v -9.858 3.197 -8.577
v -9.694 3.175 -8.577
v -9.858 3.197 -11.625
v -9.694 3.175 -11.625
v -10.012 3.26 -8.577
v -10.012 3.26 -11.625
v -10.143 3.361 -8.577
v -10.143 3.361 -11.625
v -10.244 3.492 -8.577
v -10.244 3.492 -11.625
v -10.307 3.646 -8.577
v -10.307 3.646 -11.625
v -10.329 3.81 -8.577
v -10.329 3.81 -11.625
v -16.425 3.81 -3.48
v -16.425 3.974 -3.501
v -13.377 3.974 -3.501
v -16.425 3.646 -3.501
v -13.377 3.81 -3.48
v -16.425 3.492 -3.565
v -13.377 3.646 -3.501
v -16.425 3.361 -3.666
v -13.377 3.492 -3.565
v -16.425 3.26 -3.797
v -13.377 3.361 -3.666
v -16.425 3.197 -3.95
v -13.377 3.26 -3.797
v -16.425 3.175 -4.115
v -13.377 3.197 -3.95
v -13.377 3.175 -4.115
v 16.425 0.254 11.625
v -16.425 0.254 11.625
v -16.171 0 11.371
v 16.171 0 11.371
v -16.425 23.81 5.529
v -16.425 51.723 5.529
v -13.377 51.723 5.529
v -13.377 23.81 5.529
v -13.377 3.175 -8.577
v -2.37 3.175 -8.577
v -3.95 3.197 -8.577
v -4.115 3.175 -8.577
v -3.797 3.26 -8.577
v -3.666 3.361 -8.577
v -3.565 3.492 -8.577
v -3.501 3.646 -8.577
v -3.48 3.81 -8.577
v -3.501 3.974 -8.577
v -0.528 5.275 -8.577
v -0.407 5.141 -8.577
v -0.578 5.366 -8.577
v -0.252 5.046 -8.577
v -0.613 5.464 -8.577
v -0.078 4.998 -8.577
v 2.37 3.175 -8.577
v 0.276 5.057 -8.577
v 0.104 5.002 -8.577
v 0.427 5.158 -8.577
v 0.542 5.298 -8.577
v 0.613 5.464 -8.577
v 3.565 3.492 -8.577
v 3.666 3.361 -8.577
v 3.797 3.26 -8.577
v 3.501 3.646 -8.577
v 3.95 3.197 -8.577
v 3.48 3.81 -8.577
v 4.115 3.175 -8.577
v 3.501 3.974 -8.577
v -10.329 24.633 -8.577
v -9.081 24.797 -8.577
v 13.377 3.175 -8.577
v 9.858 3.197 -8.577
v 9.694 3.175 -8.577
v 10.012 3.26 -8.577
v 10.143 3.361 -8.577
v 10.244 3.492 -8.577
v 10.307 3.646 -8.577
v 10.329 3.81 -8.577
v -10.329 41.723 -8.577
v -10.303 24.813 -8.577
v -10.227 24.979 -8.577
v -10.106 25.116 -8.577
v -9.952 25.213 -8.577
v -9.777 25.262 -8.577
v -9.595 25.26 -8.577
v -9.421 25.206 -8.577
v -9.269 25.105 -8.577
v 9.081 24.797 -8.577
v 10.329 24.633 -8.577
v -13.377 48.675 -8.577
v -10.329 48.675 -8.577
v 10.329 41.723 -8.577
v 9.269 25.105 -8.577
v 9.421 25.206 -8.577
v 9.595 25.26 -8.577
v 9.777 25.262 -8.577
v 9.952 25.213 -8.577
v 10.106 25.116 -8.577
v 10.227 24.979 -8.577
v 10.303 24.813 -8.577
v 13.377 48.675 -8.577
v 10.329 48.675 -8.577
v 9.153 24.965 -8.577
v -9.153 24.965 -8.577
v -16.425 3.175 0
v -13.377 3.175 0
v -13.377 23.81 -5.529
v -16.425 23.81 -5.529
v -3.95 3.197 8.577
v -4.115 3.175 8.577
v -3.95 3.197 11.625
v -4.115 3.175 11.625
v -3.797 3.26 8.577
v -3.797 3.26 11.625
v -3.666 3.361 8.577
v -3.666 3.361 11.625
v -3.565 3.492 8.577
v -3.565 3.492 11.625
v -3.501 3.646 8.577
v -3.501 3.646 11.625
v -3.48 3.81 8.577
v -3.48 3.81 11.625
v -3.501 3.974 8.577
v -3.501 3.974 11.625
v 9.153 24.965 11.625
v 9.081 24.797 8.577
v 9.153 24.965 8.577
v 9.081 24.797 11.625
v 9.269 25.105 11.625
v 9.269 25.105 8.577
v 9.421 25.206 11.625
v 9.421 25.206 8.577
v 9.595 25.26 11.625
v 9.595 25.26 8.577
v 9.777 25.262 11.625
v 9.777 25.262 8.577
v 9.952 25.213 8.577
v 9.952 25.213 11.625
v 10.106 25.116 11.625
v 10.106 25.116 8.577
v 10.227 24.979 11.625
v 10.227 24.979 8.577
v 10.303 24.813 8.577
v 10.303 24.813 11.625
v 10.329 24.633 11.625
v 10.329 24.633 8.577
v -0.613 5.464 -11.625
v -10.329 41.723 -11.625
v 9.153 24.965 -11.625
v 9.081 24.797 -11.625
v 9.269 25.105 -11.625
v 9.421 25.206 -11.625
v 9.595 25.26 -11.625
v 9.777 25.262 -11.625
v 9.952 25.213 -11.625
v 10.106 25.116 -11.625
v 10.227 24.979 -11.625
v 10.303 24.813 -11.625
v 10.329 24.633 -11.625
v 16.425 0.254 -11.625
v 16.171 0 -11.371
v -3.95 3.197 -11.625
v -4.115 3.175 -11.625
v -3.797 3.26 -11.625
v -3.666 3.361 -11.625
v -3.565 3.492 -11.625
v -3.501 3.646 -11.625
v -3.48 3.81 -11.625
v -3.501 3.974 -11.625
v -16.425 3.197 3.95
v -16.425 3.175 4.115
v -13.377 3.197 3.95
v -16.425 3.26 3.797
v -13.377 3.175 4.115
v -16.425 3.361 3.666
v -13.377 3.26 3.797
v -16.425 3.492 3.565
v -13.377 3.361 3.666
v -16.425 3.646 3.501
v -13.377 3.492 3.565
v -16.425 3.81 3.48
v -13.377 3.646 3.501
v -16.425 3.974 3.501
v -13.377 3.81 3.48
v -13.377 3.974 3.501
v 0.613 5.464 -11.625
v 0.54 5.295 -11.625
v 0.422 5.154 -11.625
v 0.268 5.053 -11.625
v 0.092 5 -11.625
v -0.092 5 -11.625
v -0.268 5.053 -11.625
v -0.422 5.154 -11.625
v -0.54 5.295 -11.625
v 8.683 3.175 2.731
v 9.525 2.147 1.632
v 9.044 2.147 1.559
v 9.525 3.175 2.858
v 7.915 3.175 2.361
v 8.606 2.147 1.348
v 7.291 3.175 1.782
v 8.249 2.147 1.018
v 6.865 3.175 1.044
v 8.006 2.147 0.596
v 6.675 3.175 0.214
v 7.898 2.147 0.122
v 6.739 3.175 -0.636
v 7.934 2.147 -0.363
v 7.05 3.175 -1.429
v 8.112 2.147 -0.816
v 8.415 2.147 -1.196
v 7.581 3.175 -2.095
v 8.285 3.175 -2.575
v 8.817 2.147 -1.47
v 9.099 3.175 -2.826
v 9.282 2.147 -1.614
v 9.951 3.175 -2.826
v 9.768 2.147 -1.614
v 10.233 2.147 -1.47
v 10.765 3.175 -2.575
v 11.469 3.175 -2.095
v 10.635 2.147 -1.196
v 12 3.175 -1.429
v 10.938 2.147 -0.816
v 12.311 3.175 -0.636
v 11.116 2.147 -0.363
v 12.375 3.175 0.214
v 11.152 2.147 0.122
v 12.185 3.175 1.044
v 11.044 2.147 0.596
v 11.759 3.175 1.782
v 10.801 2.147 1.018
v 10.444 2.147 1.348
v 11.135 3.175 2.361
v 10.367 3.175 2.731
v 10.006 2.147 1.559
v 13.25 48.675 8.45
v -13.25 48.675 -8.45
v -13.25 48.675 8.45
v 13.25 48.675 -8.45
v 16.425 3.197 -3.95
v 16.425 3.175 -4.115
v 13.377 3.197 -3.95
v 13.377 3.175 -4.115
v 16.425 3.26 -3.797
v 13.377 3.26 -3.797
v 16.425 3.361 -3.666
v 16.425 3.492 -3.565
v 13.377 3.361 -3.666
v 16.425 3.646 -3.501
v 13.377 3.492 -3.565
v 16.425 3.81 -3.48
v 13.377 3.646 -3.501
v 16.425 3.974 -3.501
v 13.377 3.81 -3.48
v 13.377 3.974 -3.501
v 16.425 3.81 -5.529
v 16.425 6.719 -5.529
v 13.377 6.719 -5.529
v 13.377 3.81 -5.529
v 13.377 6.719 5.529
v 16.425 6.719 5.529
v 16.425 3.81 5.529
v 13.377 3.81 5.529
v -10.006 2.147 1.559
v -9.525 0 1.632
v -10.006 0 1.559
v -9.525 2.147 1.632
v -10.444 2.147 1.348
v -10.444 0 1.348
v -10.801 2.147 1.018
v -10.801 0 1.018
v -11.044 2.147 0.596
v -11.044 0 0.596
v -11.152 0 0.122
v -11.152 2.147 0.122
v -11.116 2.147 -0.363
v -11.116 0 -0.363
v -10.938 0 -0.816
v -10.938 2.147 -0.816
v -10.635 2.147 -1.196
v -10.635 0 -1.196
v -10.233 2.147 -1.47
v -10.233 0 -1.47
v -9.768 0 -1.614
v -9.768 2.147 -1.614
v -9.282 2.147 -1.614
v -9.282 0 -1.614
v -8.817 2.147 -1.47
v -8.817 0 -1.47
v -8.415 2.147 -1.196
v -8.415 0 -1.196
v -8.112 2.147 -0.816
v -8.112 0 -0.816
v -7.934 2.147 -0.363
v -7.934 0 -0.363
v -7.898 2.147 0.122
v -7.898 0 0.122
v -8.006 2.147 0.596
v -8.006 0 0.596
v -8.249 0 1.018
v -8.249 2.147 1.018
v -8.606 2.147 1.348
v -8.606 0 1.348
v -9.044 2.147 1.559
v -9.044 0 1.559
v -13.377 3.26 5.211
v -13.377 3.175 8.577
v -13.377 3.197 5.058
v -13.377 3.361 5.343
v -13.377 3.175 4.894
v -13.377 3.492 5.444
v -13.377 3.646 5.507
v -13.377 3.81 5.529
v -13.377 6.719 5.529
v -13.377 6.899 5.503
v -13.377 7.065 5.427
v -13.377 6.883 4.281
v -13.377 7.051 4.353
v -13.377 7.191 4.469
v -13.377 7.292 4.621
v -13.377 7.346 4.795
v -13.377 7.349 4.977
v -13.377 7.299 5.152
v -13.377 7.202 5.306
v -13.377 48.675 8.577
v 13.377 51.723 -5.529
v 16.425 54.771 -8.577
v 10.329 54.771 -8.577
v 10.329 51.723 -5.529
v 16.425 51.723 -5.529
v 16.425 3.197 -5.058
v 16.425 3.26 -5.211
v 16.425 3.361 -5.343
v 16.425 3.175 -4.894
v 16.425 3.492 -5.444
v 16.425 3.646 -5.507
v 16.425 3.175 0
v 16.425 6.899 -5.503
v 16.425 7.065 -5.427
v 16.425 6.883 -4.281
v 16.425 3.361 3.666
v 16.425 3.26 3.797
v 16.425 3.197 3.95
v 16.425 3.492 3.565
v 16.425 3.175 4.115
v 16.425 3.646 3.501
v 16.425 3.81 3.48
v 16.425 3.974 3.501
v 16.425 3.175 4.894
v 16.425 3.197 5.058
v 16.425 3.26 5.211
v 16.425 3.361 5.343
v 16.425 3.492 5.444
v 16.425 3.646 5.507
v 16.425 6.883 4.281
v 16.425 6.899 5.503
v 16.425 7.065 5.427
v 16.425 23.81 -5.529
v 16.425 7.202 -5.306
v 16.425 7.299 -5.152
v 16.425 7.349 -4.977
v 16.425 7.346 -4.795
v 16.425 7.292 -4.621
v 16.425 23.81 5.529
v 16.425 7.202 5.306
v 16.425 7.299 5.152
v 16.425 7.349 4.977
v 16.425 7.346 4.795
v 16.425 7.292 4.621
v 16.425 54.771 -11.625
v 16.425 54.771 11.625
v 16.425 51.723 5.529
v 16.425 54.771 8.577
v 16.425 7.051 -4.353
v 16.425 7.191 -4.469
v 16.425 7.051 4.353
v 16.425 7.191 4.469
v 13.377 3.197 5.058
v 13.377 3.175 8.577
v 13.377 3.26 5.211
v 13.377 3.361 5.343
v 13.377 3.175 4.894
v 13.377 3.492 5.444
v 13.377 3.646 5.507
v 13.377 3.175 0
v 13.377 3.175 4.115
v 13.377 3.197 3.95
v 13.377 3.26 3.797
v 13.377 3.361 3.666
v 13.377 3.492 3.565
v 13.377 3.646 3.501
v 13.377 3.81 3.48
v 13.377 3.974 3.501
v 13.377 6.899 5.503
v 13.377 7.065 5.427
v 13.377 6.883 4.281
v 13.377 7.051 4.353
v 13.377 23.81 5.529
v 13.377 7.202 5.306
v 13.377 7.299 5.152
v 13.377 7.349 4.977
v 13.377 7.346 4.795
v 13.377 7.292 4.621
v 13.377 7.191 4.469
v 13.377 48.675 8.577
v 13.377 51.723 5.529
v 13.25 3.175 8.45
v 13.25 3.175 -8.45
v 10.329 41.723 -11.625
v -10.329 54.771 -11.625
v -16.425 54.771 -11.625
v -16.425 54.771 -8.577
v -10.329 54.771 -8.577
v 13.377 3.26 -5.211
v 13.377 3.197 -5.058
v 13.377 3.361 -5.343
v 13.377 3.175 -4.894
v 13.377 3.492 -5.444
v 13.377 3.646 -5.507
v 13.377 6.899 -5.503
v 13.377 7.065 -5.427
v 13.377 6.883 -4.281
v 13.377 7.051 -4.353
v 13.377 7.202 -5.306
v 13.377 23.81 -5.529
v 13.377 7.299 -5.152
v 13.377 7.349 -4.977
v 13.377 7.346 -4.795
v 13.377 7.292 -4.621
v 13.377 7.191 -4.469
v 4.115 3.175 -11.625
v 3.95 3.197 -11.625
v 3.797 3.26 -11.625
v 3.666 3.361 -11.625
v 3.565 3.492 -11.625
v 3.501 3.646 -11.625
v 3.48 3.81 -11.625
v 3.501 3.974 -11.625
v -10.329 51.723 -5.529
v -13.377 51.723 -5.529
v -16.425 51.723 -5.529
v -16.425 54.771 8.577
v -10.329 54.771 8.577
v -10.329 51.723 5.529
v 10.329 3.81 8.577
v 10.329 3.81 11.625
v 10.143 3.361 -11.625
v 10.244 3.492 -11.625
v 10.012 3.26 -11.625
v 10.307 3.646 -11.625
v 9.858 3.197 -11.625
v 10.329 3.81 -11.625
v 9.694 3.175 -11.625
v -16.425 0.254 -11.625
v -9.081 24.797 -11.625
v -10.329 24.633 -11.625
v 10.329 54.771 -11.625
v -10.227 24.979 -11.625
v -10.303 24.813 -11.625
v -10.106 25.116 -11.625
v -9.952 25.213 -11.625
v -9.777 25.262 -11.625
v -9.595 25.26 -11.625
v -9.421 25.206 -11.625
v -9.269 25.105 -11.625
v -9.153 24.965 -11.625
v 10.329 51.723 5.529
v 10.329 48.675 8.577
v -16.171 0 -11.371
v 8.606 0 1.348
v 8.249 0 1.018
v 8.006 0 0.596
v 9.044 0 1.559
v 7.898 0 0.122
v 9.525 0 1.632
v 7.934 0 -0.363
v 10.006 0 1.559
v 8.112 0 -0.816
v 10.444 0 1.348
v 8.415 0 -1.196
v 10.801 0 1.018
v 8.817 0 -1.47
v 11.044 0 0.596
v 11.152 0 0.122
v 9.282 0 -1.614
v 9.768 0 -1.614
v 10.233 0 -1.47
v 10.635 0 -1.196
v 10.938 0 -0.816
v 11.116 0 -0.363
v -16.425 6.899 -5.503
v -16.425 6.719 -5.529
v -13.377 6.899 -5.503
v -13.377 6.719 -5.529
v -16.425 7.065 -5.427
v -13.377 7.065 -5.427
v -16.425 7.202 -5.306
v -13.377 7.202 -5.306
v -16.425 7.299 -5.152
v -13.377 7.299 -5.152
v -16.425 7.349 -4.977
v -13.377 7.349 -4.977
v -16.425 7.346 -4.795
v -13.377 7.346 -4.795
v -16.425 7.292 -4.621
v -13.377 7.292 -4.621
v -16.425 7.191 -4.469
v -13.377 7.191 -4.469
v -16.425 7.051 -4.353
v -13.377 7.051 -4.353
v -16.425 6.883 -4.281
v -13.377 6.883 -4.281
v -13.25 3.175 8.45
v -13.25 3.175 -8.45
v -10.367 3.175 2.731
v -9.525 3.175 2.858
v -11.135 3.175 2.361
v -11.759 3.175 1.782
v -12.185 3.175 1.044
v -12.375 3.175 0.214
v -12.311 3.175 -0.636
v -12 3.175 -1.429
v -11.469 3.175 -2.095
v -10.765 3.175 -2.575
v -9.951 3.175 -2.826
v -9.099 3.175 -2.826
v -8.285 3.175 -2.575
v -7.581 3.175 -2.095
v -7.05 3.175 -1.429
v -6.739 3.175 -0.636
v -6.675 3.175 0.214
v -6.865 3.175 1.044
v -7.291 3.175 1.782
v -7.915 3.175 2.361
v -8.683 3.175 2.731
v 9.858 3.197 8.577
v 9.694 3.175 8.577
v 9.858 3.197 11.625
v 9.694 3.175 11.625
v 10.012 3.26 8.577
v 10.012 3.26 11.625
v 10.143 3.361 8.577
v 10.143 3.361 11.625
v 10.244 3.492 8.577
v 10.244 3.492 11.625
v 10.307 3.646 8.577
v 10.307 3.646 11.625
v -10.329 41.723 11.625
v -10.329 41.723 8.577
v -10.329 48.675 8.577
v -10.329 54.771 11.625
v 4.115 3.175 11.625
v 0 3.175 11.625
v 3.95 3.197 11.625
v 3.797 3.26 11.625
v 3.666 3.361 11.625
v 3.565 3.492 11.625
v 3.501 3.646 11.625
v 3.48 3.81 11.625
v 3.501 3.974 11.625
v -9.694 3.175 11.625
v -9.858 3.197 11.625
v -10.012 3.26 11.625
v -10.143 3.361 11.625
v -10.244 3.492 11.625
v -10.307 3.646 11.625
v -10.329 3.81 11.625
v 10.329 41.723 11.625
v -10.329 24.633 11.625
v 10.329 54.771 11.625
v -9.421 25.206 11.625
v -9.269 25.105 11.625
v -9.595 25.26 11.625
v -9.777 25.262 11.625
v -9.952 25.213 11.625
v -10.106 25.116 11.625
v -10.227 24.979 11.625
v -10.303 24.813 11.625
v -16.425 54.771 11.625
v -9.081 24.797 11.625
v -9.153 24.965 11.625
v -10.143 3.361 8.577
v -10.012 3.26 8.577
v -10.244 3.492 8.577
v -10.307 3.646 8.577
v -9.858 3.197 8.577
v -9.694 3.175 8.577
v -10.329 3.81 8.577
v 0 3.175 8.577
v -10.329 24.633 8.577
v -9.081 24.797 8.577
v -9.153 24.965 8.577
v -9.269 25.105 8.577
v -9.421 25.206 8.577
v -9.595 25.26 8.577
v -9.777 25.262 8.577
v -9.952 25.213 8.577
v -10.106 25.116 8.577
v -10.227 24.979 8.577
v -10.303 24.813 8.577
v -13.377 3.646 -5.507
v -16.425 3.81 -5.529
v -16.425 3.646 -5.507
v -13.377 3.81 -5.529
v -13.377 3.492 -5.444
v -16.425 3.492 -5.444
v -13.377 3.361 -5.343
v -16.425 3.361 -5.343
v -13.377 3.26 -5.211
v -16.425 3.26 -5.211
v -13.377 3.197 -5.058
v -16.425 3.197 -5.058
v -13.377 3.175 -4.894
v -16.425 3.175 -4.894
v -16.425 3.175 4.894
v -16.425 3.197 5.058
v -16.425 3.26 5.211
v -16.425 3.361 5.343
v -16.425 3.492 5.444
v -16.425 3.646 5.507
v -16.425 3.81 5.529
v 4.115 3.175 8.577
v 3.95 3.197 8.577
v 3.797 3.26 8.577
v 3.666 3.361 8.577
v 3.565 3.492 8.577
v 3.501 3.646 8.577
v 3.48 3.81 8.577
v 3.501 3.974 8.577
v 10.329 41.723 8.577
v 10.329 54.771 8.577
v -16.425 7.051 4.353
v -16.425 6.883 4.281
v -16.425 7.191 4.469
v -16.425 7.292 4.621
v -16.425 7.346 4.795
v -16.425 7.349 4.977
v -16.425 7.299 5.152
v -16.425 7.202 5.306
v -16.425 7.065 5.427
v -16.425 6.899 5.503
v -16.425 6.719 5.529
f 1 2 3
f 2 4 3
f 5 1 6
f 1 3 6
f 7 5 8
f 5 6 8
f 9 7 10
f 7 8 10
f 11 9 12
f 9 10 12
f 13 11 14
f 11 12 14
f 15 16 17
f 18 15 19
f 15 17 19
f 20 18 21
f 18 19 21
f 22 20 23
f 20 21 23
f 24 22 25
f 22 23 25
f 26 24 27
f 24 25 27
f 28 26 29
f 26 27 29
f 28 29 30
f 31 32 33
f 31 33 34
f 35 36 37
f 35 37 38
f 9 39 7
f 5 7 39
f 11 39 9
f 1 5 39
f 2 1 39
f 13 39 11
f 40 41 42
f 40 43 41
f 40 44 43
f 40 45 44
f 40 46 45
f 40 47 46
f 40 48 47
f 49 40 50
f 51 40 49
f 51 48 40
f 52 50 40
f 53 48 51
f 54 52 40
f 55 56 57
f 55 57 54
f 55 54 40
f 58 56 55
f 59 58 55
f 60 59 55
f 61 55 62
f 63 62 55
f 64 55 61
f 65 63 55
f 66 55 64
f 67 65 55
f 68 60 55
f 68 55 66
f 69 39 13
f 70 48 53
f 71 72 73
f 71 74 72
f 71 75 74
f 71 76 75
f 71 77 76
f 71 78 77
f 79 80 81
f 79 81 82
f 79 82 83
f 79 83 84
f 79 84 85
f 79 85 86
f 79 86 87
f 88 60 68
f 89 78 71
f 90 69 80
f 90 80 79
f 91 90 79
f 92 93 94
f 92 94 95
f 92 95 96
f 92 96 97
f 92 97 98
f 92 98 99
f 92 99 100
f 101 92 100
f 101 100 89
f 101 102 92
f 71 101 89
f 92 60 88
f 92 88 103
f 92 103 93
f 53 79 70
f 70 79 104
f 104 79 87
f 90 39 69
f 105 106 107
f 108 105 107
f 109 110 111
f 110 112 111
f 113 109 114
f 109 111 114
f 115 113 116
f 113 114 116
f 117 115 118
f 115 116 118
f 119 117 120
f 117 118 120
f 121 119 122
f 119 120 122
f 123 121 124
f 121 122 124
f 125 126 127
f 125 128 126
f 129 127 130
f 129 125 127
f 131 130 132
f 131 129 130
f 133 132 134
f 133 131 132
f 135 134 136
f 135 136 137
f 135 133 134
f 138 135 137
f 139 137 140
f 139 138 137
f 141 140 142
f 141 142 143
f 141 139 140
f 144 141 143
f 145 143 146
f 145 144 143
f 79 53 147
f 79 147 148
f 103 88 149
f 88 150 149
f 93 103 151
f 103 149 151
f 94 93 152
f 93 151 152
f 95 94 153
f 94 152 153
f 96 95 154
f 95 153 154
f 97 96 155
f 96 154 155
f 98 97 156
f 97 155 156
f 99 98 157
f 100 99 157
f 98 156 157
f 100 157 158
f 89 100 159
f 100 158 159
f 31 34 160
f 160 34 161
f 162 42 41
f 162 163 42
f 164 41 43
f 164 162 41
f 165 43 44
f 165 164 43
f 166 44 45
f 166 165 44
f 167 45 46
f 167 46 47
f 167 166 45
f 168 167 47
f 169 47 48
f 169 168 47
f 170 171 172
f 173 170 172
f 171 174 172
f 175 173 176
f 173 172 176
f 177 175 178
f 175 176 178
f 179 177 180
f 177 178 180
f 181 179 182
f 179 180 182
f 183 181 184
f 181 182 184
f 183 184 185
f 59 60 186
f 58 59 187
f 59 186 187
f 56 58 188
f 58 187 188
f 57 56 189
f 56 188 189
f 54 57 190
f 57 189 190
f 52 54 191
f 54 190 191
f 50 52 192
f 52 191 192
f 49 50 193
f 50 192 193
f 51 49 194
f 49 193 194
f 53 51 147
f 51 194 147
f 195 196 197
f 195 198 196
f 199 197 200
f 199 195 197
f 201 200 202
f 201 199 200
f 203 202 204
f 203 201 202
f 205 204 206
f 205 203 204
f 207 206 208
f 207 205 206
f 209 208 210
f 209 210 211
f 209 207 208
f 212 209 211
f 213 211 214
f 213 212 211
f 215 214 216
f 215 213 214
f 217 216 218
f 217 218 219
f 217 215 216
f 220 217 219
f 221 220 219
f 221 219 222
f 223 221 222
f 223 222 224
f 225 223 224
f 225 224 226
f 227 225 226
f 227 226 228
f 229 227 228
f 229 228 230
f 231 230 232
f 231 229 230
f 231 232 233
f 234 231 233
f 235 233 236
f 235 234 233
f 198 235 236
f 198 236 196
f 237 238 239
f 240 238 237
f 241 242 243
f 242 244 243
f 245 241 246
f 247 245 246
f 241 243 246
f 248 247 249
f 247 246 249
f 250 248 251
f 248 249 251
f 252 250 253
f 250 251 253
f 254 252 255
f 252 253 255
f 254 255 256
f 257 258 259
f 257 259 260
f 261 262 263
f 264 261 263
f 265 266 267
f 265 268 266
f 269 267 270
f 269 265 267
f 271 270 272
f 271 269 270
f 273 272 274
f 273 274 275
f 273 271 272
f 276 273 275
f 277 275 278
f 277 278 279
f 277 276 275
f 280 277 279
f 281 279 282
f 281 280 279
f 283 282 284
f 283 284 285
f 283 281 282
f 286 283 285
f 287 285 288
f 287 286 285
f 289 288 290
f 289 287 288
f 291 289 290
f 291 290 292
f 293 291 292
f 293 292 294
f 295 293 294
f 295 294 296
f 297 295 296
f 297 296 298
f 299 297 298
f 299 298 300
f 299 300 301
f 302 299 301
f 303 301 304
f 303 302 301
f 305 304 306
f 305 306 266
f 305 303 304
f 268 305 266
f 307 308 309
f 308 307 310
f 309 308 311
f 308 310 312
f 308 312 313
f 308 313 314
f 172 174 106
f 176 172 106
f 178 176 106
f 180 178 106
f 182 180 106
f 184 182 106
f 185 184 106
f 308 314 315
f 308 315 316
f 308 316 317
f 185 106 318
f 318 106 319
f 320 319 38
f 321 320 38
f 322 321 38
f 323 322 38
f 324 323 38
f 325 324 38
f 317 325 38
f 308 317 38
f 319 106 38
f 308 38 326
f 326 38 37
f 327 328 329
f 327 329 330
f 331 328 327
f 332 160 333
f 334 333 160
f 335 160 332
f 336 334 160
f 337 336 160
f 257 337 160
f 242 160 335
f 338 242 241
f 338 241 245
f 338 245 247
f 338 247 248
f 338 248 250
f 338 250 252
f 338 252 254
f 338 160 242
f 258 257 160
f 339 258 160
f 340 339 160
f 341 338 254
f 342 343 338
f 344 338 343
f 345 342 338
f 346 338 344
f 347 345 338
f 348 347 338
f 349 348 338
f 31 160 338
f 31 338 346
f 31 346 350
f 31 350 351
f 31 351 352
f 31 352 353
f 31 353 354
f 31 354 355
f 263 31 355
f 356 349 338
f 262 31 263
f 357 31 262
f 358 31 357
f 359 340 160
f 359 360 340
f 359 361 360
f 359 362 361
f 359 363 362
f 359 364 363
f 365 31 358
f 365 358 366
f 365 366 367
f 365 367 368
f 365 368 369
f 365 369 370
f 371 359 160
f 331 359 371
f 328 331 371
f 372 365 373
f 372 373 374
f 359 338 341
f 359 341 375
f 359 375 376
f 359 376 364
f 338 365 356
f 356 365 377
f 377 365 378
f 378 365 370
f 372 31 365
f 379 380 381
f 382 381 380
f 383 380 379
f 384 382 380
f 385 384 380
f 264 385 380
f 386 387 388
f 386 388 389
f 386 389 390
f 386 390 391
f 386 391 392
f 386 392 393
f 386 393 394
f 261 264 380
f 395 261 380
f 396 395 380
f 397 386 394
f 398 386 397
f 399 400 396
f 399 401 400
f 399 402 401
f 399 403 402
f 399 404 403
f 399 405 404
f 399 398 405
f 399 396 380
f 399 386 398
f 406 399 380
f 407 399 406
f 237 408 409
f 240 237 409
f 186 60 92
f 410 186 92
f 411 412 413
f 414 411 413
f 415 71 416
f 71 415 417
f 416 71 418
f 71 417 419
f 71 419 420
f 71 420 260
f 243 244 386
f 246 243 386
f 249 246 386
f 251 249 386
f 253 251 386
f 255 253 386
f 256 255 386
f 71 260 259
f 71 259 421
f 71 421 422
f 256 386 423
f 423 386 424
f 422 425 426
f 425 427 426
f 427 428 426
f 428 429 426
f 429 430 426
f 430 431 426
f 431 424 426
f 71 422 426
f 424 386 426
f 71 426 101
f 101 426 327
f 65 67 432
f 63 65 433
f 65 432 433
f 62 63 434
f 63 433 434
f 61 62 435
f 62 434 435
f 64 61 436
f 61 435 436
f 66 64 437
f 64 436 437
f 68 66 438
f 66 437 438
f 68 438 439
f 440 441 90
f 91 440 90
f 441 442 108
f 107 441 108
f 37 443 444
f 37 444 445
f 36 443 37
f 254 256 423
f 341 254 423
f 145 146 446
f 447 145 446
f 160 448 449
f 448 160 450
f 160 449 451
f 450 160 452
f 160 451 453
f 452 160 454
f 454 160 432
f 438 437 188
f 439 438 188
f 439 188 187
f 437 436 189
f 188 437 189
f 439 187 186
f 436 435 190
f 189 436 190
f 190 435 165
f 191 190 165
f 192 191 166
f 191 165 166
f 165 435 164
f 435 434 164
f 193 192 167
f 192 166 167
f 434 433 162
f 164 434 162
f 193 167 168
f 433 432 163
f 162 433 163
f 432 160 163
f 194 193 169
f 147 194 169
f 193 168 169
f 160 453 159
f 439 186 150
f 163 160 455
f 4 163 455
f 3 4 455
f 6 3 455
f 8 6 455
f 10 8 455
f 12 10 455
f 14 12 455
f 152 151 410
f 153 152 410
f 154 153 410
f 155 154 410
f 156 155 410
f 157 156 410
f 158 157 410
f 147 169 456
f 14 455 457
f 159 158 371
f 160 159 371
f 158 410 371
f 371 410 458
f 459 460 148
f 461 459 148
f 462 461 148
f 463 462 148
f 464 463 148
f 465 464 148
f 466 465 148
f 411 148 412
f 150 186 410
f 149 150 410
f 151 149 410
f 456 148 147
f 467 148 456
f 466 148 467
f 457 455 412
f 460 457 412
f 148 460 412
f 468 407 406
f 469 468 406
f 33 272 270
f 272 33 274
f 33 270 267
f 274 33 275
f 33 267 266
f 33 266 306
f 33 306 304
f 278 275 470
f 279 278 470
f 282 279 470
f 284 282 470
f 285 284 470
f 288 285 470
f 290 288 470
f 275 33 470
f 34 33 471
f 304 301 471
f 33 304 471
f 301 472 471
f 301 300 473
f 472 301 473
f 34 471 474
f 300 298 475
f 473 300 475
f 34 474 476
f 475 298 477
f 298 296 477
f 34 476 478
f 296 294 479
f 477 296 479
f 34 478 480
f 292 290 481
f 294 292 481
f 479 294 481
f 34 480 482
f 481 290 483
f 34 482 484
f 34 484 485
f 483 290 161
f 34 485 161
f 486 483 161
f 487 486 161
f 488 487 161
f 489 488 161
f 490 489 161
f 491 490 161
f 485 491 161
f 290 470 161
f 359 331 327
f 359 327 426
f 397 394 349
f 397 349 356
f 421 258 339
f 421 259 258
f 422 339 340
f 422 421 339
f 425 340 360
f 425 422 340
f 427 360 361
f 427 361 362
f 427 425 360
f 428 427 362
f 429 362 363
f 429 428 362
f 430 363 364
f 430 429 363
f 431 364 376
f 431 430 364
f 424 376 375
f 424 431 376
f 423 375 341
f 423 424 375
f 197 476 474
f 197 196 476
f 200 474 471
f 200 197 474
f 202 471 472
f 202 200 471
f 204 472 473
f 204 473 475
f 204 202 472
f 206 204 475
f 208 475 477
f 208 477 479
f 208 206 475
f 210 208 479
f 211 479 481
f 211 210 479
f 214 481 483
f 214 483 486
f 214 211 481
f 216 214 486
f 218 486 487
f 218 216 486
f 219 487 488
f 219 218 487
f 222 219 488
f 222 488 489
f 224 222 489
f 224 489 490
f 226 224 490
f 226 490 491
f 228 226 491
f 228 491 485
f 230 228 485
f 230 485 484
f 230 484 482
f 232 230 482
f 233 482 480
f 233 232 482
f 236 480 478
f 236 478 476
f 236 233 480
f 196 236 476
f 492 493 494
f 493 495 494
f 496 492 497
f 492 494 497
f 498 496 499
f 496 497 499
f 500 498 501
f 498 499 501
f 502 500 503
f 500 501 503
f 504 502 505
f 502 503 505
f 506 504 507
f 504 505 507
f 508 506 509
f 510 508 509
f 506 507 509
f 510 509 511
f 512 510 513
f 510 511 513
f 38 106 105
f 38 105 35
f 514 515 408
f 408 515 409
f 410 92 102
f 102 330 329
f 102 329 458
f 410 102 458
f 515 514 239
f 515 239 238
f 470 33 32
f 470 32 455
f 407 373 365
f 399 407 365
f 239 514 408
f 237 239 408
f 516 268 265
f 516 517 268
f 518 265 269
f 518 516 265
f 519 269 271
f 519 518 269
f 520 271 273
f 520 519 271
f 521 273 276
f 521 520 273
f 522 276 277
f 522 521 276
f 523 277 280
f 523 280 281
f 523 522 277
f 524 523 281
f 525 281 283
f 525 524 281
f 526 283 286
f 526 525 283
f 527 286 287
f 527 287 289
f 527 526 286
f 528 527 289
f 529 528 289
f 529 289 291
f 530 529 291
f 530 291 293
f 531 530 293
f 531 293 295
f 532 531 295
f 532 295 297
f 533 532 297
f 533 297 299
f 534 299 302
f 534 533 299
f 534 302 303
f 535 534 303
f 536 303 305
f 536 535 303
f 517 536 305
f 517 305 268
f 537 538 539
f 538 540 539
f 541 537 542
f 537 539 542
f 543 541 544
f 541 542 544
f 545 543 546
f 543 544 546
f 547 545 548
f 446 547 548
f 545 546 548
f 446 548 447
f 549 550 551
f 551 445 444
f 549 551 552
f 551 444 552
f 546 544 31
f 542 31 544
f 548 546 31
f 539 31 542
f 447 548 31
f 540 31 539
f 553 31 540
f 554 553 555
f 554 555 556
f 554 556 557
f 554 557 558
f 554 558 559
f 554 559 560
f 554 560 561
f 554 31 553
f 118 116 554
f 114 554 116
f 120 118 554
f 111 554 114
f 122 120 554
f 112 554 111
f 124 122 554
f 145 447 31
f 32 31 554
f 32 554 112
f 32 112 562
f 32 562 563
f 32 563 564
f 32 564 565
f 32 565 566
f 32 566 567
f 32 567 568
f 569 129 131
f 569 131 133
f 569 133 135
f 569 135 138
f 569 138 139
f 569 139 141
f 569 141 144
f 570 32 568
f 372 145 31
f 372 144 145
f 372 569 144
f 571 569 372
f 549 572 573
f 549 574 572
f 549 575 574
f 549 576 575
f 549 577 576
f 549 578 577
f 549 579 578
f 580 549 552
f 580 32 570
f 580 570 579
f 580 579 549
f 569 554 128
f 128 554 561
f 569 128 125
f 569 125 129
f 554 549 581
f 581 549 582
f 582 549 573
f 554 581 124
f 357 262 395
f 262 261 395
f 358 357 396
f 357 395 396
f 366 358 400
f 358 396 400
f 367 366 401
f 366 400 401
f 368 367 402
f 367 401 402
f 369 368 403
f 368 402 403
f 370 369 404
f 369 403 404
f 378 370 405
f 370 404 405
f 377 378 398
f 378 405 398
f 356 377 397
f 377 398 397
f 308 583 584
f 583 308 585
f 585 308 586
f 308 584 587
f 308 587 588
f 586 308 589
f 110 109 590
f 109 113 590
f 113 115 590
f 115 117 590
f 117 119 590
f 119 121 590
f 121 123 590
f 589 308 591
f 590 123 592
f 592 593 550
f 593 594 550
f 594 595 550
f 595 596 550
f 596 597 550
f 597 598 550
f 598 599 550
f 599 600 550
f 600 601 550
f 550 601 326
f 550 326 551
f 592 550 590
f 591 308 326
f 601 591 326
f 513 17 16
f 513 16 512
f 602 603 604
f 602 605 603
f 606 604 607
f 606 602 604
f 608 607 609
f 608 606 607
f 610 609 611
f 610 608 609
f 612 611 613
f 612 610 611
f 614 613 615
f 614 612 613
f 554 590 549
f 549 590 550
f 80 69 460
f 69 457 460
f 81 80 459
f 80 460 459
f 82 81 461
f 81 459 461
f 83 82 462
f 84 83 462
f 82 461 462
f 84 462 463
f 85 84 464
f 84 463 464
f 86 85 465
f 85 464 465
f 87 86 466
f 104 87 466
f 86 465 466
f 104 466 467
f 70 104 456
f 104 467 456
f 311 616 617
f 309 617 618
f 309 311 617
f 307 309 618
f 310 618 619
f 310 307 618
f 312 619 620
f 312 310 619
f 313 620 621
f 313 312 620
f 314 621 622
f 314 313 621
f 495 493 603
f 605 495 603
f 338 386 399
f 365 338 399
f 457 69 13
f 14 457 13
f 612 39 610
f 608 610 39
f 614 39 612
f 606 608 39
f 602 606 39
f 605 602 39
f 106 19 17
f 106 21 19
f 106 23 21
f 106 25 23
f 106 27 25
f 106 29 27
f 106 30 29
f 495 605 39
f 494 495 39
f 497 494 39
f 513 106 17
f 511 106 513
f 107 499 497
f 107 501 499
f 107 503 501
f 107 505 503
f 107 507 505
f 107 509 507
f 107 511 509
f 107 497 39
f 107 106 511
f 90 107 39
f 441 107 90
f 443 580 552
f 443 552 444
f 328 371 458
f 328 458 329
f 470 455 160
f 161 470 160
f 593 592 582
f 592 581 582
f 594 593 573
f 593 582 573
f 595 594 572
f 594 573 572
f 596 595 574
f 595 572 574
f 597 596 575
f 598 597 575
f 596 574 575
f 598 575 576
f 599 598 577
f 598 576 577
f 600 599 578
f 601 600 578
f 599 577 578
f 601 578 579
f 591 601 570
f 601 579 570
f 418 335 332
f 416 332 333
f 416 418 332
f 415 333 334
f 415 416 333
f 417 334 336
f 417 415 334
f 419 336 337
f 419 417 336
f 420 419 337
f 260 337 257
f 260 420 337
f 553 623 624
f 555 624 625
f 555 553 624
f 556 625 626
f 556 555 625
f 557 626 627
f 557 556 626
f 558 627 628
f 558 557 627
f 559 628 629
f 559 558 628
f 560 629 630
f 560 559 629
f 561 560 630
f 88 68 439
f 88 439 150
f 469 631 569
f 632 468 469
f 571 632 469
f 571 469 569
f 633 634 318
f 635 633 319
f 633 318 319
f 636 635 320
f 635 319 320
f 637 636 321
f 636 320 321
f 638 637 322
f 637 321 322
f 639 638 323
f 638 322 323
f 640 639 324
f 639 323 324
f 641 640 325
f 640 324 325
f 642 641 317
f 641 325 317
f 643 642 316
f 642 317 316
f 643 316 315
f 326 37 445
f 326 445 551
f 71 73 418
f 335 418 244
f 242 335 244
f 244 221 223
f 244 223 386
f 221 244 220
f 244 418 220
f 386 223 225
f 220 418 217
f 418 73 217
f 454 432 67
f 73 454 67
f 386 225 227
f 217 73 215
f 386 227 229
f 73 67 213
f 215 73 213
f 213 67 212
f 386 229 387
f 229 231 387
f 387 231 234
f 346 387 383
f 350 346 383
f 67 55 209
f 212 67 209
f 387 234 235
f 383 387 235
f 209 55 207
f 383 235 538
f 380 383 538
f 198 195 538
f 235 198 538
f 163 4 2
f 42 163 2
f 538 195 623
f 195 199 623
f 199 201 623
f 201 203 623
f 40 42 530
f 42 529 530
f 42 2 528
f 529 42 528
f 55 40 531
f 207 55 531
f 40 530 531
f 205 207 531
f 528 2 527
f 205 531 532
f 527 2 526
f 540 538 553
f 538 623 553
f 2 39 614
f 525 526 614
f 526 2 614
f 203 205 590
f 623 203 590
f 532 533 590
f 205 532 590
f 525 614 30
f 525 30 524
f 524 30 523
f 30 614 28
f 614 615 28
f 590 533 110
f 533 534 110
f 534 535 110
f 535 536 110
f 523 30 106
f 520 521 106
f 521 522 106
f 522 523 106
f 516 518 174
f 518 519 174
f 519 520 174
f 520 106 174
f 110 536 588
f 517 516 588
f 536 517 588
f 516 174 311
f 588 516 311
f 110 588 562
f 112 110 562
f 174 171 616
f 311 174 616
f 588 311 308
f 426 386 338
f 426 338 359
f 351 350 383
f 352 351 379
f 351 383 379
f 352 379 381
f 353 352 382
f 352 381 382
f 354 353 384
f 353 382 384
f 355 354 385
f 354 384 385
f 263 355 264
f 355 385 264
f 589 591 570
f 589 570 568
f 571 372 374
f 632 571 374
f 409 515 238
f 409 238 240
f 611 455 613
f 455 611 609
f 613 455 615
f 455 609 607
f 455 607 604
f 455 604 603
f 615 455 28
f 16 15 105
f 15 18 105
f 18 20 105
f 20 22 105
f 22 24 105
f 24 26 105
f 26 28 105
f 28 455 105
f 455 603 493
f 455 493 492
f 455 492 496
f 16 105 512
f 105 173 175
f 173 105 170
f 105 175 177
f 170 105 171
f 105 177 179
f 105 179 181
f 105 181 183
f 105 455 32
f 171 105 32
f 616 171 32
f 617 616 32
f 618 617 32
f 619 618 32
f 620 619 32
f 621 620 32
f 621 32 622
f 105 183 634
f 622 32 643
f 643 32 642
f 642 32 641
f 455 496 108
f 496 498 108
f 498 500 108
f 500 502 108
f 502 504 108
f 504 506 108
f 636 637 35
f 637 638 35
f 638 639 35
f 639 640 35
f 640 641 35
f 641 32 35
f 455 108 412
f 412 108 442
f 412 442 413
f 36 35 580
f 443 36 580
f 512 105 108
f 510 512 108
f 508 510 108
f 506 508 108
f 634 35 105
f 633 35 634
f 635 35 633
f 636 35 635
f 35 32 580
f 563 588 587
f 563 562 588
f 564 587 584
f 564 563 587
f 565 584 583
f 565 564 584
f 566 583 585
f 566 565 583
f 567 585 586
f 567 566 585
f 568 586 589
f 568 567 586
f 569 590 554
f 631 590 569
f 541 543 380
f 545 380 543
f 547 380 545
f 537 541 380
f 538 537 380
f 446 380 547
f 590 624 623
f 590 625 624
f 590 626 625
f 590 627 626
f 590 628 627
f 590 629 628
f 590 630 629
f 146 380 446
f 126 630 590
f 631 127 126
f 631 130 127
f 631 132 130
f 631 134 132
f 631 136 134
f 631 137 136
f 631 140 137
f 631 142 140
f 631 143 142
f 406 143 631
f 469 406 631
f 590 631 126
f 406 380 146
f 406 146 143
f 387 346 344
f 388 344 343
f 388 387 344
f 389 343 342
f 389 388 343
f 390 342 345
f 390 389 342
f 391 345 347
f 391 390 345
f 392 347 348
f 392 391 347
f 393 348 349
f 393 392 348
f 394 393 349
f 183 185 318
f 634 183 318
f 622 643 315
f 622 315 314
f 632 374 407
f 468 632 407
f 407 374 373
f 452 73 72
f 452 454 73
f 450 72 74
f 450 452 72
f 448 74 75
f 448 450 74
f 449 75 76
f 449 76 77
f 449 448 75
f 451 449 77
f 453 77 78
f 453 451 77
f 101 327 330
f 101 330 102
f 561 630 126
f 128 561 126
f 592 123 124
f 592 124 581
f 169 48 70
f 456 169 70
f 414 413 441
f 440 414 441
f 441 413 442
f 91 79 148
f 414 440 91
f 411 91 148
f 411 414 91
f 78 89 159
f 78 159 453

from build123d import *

# Parameters (mm, degrees)
SKETCH1_W                                 = 32.850000086
SKETCH1_H                                 = 23.249999982
BOSS_EXTRUDE1_DEPTH                       = 3.175
SKETCH2_W                                 = 26.500000086
SKETCH2_H                                 = 16.899999982
BATTERY_DEPTH                             = 45.499999932
CSK_FOR_4_FLAT_HEAD_MACHINE_SCREW_2_COUNT = 2
CSK_FOR_4_FLAT_HEAD_MACHINE_SCREW_2_PITCH = 19.05
BOSS_EXTRUDE4_DEPTH                       = 45.499999932
RIB1_START                                = -3.048
RIB1_DEPTH                                = 3.048
CUT_EXTRUDE1_DEPTH                        = 3.048
MIRROR2_START                             = -3.048
MIRROR2_COPY_1_DEPTH                      = 3.048
MIRROR2_COPY_2_DEPTH                      = 3.048
BOSS_EXTRUDE5_REACH                       = 61.862
BOSS_EXTRUDE6_DEPTH                       = 3.048
BOSS_EXTRUDE7_DEPTH                       = 6.096
BOSS_EXTRUDE8_DEPTH                       = 3.048
RIB4_REACH                                = 66.916
SKETCH22_WALL_W                           = 153.195008736
SKETCH22_WALL_H                           = 3.048
CUT_EXTRUDE2_DEPTH                        = 3.048
MIRROR7_COPY_1_REACH                      = 66.916
MIRROR7_COPY_1_SKETCH_W                   = 153.195008736
MIRROR7_COPY_1_SKETCH_H                   = 3.048
MIRROR7_COPY_2_DEPTH                      = 3.048
FILLET2_R                                 = 0.635
CHAMFER_FOR_ELEPHANT_S_FOOT_SIZE          = 0.254


# Read off the part's stored shape, not the designer's step: Rib1
with BuildPart() as part:
    # Sketch1 → Boss-Extrude1 (new body)
    with BuildSketch(Plane(origin=(0, 0, 0), x_dir=(1, 0, 0), z_dir=(0, 1, 0))):
        Rectangle(SKETCH1_W, SKETCH1_H)
    extrude(amount=BOSS_EXTRUDE1_DEPTH)

    # Sketch13 → CSK for _4 Flat Head Machine Screw _100 (revolve, cut)
    with BuildSketch(Plane(origin=(-9.525, 3.175, 0), x_dir=(0, 0, 1), z_dir=(1, 0, 0))):
        Polygon((0, 0), (0, 3.175), (1.63195, 3.175), (1.63195, 1.028358553), (2.8575, 0), align=None)
    csk_for_4_flat_head_machine_screw_100 = revolve(axis=Axis((-9.525, 9.525, 0), (0, -1, 0)), mode=Mode.SUBTRACT)

    # CSK for _4 Flat Head Machine Screw _ 2: CSK for _4 Flat Head Machine Screw _100 ×2
    with Locations(*[(i * CSK_FOR_4_FLAT_HEAD_MACHINE_SCREW_2_PITCH, 0, 0) for i in range(1, CSK_FOR_4_FLAT_HEAD_MACHINE_SCREW_2_COUNT)]):
        add(csk_for_4_flat_head_machine_screw_100, mode=Mode.SUBTRACT)

    # Sketch14 → Boss-Extrude4 (add)
    with BuildSketch(Plane(origin=(0, 3.175, 0), x_dir=(1, 0, 0), z_dir=(0, 1, 0))):
        Polygon((16.425000043, -11.624999991), (16.425000043, -5.528999991), (13.377000043, -5.528999991), (13.377000043, -8.576999991), (10.329000043, -8.576999991), (10.329000043, -11.624999991), align=None)
        Polygon((13.377000043, 8.576999991), (13.377000043, 5.528999991), (16.425000043, 5.528999991), (16.425000043, 11.624999991), (10.329000043, 11.624999991), (10.329000043, 8.576999991), align=None)
        Polygon((-10.329000043, 8.576999991), (-10.329000043, 11.624999991), (-16.425000043, 11.624999991), (-16.425000043, 5.528999991), (-13.377000043, 5.528999991), (-13.377000043, 8.576999991), align=None)
        Polygon((-16.425000043, -11.624999991), (-10.329000043, -11.624999991), (-10.329000043, -8.576999991), (-13.377000043, -8.576999991), (-13.377000043, -5.528999991), (-16.425000043, -5.528999991), align=None)
    extrude(amount=BOSS_EXTRUDE4_DEPTH)

    # Rib1 outline → Rib1 (add)
    with BuildSketch(Plane.XY.offset(11.624999991).offset(RIB1_START)):
        Polygon((-10.329000043, 3.175), (0, 3.175), (-10.329000043, 41.723352952), align=None)
    rib1 = extrude(amount=RIB1_DEPTH)

    # Sketch18 → Cut-Extrude1 (cut)
    with BuildSketch(Plane(origin=(0, 0, 8.576999991), x_dir=(-1, 0, 0), z_dir=(0, 0, -1))):
        Polygon((10.329000043, 29.456094958), (10.329000043, 3.175), (3.287001873, 3.175), align=None)
    cut_extrude1 = extrude(amount=-CUT_EXTRUDE1_DEPTH, mode=Mode.SUBTRACT)

    # Mirror1: Rib1, Cut-Extrude1 across plane
    add(rib1.mirror(Plane.XY))
    add(cut_extrude1.mirror(Plane.XY), mode=Mode.SUBTRACT)

    # Mirror2: Rib1, Cut-Extrude1 across plane
    add(rib1.mirror(Plane(origin=(0, 0, 0), x_dir=(0, 0, 1), z_dir=(1, 0, 0))))
    add(cut_extrude1.mirror(Plane(origin=(0, 0, 0), x_dir=(0, 0, 1), z_dir=(1, 0, 0))), mode=Mode.SUBTRACT)

    # Mirror2 copy 1 sketch → Mirror2 copy 1 (add)
    with BuildSketch(Plane(origin=(0, 0, -11.624999991), x_dir=(-1, 0, 0), z_dir=(0, 0, -1)).offset(MIRROR2_START)):
        Polygon((-10.329000043, 3.175), (0, 3.175), (-10.329000043, 41.723352952), align=None)
    extrude(amount=MIRROR2_COPY_1_DEPTH)

    # Mirror2 copy 2 sketch → Mirror2 copy 2 (cut)
    with BuildSketch(Plane.XY.offset(-8.576999991)):
        Polygon((10.329000043, 29.456094958), (10.329000043, 3.175), (3.287001873, 3.175), align=None)
    extrude(amount=-MIRROR2_COPY_2_DEPTH, mode=Mode.SUBTRACT)

    # Boss-Extrude5: up to this face of the body (flat: up to its plane)
    boss_extrude5_end = Plane(part.part.faces().sort_by_distance((10.329000043, 45.199176442, 10.100999991))[0])
    # Sketch19 → Boss-Extrude5 (add, up to the picked face)
    with BuildSketch(Plane.ZY.offset(-16.425000043), mode=Mode.PRIVATE) as boss_extrude5_sk1:
        Polygon((5.528999991, 51.722999932), (8.576999991, 48.674999932), (11.624999991, 48.674999932), (11.624999991, 51.722999932), align=None)
    boss_extrude5_tool1 = split(extrude(boss_extrude5_sk1.sketch, amount=BOSS_EXTRUDE5_REACH, mode=Mode.PRIVATE), bisect_by=boss_extrude5_end, keep=Keep.BOTH, mode=Mode.PRIVATE)
    # Sketch19 → Boss-Extrude5 (add, up to the picked face)
    with BuildSketch(Plane.ZY.offset(-16.425000043), mode=Mode.PRIVATE) as boss_extrude5_sk2:
        Polygon((8.576999991, 54.770999932), (5.528999991, 51.722999932), (11.624999991, 51.722999932), (11.624999991, 54.770999932), align=None)
    boss_extrude5_tool2 = split(extrude(boss_extrude5_sk2.sketch, amount=BOSS_EXTRUDE5_REACH, mode=Mode.PRIVATE), bisect_by=boss_extrude5_end, keep=Keep.BOTH, mode=Mode.PRIVATE)
    boss_extrude5_1 = boss_extrude5_tool1.solids().sort_by(Axis((16.425, 50.368333, 9.254333), (-1, 0, 0)))[0]
    add(boss_extrude5_1)
    boss_extrude5_2 = boss_extrude5_tool2.solids().sort_by(Axis((16.425, 53.077667, 9.254333), (-1, 0, 0)))[0]
    add(boss_extrude5_2)
    boss_extrude5 = boss_extrude5_1 + boss_extrude5_2  # Boss-Extrude5 as one shape, for the pattern or mirror that repeats it

    # Sketch19<3> → Boss-Extrude6 (add)
    with BuildSketch(Plane.ZY.offset(-16.425000043)):
        Polygon((5.528999991, 48.674999932), (8.576999991, 48.674999932), (5.528999991, 51.722999932), align=None)
    boss_extrude6 = extrude(amount=BOSS_EXTRUDE6_DEPTH)

    # Sketch20 → Boss-Extrude7 (add)
    with BuildSketch(Plane.ZY.offset(16.425000043)):
        Polygon((8.576999991, 54.770999932), (5.528999991, 51.722999932), (8.576999991, 48.674999932), (11.624999991, 48.674999932), (11.624999991, 54.770999932), align=None)
    boss_extrude7 = extrude(amount=-BOSS_EXTRUDE7_DEPTH)

    # Sketch20<3> → Boss-Extrude8 (add)
    with BuildSketch(Plane.ZY.offset(16.425000043)):
        Polygon((5.528999991, 51.722999932), (5.528999991, 48.674999932), (8.576999991, 48.674999932), align=None)
    boss_extrude8 = extrude(amount=-BOSS_EXTRUDE8_DEPTH)

    # Mirror3: Boss-Extrude5, Boss-Extrude6, Boss-Extrude7, Boss-Extrude8 across plane
    add(boss_extrude5.mirror(Plane.XY))
    add(boss_extrude6.mirror(Plane.XY))
    add(boss_extrude7.mirror(Plane.XY))
    add(boss_extrude8.mirror(Plane.XY))

    # Sketch22 wall → Rib4 (add, up to next)
    with BuildSketch(Plane(origin=(16.425000043, 13.492254441, 2.764499996), x_dir=(0, 0.965925826288, 0.258819045108), z_dir=(0, -0.258819045108, 0.965925826288)), mode=Mode.PRIVATE) as rib4_sk1:
        with Locations((0, 1.524)):
            Rectangle(SKETCH22_WALL_W, SKETCH22_WALL_H)
    rib4_tool1 = extrude(rib4_sk1.sketch, amount=RIB4_REACH, mode=Mode.PRIVATE) - part.part
    rib4 = rib4_tool1.solids().sort_by_distance((16.425000043, 13.492254441, 2.764499996))[0]
    add(rib4)

    # Sketch23 → Cut-Extrude2 (cut)
    with BuildSketch(Plane(origin=(16.425000043, 0, 0), x_dir=(0, 0, -1), z_dir=(1, 0, 0))):
        Polygon((-5.528999991, 3.175), (-3.287001873, 3.175), (-5.528999991, 11.542250888), align=None)
    cut_extrude2 = extrude(amount=-CUT_EXTRUDE2_DEPTH, mode=Mode.SUBTRACT)

    # Mirror6: Rib4, Cut-Extrude2 across plane
    add(rib4.mirror(Plane(origin=(0, 0, 0), x_dir=(0, 0, 1), z_dir=(1, 0, 0))))
    add(cut_extrude2.mirror(Plane(origin=(0, 0, 0), x_dir=(0, 0, 1), z_dir=(1, 0, 0))), mode=Mode.SUBTRACT)

    # Mirror7: Rib4, Cut-Extrude2 across plane
    add(rib4.mirror(Plane.XY))
    add(cut_extrude2.mirror(Plane.XY), mode=Mode.SUBTRACT)

    # Mirror7 copy 1 sketch → Mirror7 copy 1 (add, up to next)
    with BuildSketch(Plane(origin=(-16.425000043, 13.492254441, -2.764499996), x_dir=(0, 0.965925826288, -0.258819045108), z_dir=(0, -0.258819045108, -0.965925826288)), mode=Mode.PRIVATE) as mirror7_copy_1_sk1:
        with Locations((0, 1.524)):
            Rectangle(MIRROR7_COPY_1_SKETCH_W, MIRROR7_COPY_1_SKETCH_H)
    mirror7_copy_1_tool1 = extrude(mirror7_copy_1_sk1.sketch, amount=MIRROR7_COPY_1_REACH, mode=Mode.PRIVATE) - part.part
    add(mirror7_copy_1_tool1.solids().sort_by_distance((-16.425000043, 13.492254441, -2.764499996))[0])

    # Mirror7 copy 2 sketch → Mirror7 copy 2 (cut)
    with BuildSketch(Plane.ZY.offset(16.425000043)):
        Polygon((-5.528999991, 3.175), (-3.287001873, 3.175), (-5.528999991, 11.542250888), align=None)
    extrude(amount=-MIRROR7_COPY_2_DEPTH, mode=Mode.SUBTRACT)

    # Fillet2
    fillet2_edges = [part.edges().sort_by_distance(p)[0] for p in [
        (-3.287001873, 3.175, 10.100999991),
        (-10.329000043, 29.456094958, 10.100999991),
        (-10.329000043, 3.175, 10.100999991),
        (0, 3.175, -10.100999991),
        (-10.329000043, 29.456094958, -10.100999991),
        (-3.287001873, 3.175, -10.100999991),
        (-10.329000043, 3.175, -10.100999991),
        (10.329000043, 29.456094958, 10.100999991),
        (3.287001873, 3.175, 10.100999991),
        (10.329000043, 3.175, 10.100999991),
        (3.287001873, 3.175, -10.100999991),
        (10.329000043, 29.456094958, -10.100999991),
        (10.329000043, 3.175, -10.100999991),
        (14.901000043, 3.175, 5.528999991),
        (14.901000043, 11.542250888, 5.528999991),
        (14.901000043, 3.175, 3.287001873),
        (-14.901000043, 11.542250888, 5.528999991),
        (-14.901000043, 3.175, 5.528999991),
        (-14.901000043, 3.175, 3.287001873),
        (-14.901000043, 3.175, -5.528999991),
        (-14.901000043, 11.542250888, -5.528999991),
        (-14.901000043, 3.175, -3.287001873),
        (14.901000043, 11.542250888, -5.528999991),
        (14.901000043, 3.175, -5.528999991),
        (14.901000043, 3.175, -3.287001873),
    ]]
    fillet(fillet2_edges, radius=FILLET2_R)

    # Chamfer for Elephant's foot
    chamfer_for_elephant_s_foot_edges = [part.edges().sort_by_distance(p)[0] for p in [
        (0, 0, -11.624999991),
        (16.425000043, 0, 0),
        (0, 0, 11.624999991),
        (-16.425000043, 0, 0),
    ]]
    chamfer(chamfer_for_elephant_s_foot_edges, length=CHAMFER_FOR_ELEPHANT_S_FOOT_SIZE)


with BuildPart() as body_2:
    # Sketch2 → Battery (new body)
    with BuildSketch(Plane(origin=(0, 3.175, 0), x_dir=(1, 0, 0), z_dir=(0, 1, 0))):
        Rectangle(SKETCH2_W, SKETCH2_H)
    extrude(amount=BATTERY_DEPTH)


solid = Compound([part.part, body_2.part])
